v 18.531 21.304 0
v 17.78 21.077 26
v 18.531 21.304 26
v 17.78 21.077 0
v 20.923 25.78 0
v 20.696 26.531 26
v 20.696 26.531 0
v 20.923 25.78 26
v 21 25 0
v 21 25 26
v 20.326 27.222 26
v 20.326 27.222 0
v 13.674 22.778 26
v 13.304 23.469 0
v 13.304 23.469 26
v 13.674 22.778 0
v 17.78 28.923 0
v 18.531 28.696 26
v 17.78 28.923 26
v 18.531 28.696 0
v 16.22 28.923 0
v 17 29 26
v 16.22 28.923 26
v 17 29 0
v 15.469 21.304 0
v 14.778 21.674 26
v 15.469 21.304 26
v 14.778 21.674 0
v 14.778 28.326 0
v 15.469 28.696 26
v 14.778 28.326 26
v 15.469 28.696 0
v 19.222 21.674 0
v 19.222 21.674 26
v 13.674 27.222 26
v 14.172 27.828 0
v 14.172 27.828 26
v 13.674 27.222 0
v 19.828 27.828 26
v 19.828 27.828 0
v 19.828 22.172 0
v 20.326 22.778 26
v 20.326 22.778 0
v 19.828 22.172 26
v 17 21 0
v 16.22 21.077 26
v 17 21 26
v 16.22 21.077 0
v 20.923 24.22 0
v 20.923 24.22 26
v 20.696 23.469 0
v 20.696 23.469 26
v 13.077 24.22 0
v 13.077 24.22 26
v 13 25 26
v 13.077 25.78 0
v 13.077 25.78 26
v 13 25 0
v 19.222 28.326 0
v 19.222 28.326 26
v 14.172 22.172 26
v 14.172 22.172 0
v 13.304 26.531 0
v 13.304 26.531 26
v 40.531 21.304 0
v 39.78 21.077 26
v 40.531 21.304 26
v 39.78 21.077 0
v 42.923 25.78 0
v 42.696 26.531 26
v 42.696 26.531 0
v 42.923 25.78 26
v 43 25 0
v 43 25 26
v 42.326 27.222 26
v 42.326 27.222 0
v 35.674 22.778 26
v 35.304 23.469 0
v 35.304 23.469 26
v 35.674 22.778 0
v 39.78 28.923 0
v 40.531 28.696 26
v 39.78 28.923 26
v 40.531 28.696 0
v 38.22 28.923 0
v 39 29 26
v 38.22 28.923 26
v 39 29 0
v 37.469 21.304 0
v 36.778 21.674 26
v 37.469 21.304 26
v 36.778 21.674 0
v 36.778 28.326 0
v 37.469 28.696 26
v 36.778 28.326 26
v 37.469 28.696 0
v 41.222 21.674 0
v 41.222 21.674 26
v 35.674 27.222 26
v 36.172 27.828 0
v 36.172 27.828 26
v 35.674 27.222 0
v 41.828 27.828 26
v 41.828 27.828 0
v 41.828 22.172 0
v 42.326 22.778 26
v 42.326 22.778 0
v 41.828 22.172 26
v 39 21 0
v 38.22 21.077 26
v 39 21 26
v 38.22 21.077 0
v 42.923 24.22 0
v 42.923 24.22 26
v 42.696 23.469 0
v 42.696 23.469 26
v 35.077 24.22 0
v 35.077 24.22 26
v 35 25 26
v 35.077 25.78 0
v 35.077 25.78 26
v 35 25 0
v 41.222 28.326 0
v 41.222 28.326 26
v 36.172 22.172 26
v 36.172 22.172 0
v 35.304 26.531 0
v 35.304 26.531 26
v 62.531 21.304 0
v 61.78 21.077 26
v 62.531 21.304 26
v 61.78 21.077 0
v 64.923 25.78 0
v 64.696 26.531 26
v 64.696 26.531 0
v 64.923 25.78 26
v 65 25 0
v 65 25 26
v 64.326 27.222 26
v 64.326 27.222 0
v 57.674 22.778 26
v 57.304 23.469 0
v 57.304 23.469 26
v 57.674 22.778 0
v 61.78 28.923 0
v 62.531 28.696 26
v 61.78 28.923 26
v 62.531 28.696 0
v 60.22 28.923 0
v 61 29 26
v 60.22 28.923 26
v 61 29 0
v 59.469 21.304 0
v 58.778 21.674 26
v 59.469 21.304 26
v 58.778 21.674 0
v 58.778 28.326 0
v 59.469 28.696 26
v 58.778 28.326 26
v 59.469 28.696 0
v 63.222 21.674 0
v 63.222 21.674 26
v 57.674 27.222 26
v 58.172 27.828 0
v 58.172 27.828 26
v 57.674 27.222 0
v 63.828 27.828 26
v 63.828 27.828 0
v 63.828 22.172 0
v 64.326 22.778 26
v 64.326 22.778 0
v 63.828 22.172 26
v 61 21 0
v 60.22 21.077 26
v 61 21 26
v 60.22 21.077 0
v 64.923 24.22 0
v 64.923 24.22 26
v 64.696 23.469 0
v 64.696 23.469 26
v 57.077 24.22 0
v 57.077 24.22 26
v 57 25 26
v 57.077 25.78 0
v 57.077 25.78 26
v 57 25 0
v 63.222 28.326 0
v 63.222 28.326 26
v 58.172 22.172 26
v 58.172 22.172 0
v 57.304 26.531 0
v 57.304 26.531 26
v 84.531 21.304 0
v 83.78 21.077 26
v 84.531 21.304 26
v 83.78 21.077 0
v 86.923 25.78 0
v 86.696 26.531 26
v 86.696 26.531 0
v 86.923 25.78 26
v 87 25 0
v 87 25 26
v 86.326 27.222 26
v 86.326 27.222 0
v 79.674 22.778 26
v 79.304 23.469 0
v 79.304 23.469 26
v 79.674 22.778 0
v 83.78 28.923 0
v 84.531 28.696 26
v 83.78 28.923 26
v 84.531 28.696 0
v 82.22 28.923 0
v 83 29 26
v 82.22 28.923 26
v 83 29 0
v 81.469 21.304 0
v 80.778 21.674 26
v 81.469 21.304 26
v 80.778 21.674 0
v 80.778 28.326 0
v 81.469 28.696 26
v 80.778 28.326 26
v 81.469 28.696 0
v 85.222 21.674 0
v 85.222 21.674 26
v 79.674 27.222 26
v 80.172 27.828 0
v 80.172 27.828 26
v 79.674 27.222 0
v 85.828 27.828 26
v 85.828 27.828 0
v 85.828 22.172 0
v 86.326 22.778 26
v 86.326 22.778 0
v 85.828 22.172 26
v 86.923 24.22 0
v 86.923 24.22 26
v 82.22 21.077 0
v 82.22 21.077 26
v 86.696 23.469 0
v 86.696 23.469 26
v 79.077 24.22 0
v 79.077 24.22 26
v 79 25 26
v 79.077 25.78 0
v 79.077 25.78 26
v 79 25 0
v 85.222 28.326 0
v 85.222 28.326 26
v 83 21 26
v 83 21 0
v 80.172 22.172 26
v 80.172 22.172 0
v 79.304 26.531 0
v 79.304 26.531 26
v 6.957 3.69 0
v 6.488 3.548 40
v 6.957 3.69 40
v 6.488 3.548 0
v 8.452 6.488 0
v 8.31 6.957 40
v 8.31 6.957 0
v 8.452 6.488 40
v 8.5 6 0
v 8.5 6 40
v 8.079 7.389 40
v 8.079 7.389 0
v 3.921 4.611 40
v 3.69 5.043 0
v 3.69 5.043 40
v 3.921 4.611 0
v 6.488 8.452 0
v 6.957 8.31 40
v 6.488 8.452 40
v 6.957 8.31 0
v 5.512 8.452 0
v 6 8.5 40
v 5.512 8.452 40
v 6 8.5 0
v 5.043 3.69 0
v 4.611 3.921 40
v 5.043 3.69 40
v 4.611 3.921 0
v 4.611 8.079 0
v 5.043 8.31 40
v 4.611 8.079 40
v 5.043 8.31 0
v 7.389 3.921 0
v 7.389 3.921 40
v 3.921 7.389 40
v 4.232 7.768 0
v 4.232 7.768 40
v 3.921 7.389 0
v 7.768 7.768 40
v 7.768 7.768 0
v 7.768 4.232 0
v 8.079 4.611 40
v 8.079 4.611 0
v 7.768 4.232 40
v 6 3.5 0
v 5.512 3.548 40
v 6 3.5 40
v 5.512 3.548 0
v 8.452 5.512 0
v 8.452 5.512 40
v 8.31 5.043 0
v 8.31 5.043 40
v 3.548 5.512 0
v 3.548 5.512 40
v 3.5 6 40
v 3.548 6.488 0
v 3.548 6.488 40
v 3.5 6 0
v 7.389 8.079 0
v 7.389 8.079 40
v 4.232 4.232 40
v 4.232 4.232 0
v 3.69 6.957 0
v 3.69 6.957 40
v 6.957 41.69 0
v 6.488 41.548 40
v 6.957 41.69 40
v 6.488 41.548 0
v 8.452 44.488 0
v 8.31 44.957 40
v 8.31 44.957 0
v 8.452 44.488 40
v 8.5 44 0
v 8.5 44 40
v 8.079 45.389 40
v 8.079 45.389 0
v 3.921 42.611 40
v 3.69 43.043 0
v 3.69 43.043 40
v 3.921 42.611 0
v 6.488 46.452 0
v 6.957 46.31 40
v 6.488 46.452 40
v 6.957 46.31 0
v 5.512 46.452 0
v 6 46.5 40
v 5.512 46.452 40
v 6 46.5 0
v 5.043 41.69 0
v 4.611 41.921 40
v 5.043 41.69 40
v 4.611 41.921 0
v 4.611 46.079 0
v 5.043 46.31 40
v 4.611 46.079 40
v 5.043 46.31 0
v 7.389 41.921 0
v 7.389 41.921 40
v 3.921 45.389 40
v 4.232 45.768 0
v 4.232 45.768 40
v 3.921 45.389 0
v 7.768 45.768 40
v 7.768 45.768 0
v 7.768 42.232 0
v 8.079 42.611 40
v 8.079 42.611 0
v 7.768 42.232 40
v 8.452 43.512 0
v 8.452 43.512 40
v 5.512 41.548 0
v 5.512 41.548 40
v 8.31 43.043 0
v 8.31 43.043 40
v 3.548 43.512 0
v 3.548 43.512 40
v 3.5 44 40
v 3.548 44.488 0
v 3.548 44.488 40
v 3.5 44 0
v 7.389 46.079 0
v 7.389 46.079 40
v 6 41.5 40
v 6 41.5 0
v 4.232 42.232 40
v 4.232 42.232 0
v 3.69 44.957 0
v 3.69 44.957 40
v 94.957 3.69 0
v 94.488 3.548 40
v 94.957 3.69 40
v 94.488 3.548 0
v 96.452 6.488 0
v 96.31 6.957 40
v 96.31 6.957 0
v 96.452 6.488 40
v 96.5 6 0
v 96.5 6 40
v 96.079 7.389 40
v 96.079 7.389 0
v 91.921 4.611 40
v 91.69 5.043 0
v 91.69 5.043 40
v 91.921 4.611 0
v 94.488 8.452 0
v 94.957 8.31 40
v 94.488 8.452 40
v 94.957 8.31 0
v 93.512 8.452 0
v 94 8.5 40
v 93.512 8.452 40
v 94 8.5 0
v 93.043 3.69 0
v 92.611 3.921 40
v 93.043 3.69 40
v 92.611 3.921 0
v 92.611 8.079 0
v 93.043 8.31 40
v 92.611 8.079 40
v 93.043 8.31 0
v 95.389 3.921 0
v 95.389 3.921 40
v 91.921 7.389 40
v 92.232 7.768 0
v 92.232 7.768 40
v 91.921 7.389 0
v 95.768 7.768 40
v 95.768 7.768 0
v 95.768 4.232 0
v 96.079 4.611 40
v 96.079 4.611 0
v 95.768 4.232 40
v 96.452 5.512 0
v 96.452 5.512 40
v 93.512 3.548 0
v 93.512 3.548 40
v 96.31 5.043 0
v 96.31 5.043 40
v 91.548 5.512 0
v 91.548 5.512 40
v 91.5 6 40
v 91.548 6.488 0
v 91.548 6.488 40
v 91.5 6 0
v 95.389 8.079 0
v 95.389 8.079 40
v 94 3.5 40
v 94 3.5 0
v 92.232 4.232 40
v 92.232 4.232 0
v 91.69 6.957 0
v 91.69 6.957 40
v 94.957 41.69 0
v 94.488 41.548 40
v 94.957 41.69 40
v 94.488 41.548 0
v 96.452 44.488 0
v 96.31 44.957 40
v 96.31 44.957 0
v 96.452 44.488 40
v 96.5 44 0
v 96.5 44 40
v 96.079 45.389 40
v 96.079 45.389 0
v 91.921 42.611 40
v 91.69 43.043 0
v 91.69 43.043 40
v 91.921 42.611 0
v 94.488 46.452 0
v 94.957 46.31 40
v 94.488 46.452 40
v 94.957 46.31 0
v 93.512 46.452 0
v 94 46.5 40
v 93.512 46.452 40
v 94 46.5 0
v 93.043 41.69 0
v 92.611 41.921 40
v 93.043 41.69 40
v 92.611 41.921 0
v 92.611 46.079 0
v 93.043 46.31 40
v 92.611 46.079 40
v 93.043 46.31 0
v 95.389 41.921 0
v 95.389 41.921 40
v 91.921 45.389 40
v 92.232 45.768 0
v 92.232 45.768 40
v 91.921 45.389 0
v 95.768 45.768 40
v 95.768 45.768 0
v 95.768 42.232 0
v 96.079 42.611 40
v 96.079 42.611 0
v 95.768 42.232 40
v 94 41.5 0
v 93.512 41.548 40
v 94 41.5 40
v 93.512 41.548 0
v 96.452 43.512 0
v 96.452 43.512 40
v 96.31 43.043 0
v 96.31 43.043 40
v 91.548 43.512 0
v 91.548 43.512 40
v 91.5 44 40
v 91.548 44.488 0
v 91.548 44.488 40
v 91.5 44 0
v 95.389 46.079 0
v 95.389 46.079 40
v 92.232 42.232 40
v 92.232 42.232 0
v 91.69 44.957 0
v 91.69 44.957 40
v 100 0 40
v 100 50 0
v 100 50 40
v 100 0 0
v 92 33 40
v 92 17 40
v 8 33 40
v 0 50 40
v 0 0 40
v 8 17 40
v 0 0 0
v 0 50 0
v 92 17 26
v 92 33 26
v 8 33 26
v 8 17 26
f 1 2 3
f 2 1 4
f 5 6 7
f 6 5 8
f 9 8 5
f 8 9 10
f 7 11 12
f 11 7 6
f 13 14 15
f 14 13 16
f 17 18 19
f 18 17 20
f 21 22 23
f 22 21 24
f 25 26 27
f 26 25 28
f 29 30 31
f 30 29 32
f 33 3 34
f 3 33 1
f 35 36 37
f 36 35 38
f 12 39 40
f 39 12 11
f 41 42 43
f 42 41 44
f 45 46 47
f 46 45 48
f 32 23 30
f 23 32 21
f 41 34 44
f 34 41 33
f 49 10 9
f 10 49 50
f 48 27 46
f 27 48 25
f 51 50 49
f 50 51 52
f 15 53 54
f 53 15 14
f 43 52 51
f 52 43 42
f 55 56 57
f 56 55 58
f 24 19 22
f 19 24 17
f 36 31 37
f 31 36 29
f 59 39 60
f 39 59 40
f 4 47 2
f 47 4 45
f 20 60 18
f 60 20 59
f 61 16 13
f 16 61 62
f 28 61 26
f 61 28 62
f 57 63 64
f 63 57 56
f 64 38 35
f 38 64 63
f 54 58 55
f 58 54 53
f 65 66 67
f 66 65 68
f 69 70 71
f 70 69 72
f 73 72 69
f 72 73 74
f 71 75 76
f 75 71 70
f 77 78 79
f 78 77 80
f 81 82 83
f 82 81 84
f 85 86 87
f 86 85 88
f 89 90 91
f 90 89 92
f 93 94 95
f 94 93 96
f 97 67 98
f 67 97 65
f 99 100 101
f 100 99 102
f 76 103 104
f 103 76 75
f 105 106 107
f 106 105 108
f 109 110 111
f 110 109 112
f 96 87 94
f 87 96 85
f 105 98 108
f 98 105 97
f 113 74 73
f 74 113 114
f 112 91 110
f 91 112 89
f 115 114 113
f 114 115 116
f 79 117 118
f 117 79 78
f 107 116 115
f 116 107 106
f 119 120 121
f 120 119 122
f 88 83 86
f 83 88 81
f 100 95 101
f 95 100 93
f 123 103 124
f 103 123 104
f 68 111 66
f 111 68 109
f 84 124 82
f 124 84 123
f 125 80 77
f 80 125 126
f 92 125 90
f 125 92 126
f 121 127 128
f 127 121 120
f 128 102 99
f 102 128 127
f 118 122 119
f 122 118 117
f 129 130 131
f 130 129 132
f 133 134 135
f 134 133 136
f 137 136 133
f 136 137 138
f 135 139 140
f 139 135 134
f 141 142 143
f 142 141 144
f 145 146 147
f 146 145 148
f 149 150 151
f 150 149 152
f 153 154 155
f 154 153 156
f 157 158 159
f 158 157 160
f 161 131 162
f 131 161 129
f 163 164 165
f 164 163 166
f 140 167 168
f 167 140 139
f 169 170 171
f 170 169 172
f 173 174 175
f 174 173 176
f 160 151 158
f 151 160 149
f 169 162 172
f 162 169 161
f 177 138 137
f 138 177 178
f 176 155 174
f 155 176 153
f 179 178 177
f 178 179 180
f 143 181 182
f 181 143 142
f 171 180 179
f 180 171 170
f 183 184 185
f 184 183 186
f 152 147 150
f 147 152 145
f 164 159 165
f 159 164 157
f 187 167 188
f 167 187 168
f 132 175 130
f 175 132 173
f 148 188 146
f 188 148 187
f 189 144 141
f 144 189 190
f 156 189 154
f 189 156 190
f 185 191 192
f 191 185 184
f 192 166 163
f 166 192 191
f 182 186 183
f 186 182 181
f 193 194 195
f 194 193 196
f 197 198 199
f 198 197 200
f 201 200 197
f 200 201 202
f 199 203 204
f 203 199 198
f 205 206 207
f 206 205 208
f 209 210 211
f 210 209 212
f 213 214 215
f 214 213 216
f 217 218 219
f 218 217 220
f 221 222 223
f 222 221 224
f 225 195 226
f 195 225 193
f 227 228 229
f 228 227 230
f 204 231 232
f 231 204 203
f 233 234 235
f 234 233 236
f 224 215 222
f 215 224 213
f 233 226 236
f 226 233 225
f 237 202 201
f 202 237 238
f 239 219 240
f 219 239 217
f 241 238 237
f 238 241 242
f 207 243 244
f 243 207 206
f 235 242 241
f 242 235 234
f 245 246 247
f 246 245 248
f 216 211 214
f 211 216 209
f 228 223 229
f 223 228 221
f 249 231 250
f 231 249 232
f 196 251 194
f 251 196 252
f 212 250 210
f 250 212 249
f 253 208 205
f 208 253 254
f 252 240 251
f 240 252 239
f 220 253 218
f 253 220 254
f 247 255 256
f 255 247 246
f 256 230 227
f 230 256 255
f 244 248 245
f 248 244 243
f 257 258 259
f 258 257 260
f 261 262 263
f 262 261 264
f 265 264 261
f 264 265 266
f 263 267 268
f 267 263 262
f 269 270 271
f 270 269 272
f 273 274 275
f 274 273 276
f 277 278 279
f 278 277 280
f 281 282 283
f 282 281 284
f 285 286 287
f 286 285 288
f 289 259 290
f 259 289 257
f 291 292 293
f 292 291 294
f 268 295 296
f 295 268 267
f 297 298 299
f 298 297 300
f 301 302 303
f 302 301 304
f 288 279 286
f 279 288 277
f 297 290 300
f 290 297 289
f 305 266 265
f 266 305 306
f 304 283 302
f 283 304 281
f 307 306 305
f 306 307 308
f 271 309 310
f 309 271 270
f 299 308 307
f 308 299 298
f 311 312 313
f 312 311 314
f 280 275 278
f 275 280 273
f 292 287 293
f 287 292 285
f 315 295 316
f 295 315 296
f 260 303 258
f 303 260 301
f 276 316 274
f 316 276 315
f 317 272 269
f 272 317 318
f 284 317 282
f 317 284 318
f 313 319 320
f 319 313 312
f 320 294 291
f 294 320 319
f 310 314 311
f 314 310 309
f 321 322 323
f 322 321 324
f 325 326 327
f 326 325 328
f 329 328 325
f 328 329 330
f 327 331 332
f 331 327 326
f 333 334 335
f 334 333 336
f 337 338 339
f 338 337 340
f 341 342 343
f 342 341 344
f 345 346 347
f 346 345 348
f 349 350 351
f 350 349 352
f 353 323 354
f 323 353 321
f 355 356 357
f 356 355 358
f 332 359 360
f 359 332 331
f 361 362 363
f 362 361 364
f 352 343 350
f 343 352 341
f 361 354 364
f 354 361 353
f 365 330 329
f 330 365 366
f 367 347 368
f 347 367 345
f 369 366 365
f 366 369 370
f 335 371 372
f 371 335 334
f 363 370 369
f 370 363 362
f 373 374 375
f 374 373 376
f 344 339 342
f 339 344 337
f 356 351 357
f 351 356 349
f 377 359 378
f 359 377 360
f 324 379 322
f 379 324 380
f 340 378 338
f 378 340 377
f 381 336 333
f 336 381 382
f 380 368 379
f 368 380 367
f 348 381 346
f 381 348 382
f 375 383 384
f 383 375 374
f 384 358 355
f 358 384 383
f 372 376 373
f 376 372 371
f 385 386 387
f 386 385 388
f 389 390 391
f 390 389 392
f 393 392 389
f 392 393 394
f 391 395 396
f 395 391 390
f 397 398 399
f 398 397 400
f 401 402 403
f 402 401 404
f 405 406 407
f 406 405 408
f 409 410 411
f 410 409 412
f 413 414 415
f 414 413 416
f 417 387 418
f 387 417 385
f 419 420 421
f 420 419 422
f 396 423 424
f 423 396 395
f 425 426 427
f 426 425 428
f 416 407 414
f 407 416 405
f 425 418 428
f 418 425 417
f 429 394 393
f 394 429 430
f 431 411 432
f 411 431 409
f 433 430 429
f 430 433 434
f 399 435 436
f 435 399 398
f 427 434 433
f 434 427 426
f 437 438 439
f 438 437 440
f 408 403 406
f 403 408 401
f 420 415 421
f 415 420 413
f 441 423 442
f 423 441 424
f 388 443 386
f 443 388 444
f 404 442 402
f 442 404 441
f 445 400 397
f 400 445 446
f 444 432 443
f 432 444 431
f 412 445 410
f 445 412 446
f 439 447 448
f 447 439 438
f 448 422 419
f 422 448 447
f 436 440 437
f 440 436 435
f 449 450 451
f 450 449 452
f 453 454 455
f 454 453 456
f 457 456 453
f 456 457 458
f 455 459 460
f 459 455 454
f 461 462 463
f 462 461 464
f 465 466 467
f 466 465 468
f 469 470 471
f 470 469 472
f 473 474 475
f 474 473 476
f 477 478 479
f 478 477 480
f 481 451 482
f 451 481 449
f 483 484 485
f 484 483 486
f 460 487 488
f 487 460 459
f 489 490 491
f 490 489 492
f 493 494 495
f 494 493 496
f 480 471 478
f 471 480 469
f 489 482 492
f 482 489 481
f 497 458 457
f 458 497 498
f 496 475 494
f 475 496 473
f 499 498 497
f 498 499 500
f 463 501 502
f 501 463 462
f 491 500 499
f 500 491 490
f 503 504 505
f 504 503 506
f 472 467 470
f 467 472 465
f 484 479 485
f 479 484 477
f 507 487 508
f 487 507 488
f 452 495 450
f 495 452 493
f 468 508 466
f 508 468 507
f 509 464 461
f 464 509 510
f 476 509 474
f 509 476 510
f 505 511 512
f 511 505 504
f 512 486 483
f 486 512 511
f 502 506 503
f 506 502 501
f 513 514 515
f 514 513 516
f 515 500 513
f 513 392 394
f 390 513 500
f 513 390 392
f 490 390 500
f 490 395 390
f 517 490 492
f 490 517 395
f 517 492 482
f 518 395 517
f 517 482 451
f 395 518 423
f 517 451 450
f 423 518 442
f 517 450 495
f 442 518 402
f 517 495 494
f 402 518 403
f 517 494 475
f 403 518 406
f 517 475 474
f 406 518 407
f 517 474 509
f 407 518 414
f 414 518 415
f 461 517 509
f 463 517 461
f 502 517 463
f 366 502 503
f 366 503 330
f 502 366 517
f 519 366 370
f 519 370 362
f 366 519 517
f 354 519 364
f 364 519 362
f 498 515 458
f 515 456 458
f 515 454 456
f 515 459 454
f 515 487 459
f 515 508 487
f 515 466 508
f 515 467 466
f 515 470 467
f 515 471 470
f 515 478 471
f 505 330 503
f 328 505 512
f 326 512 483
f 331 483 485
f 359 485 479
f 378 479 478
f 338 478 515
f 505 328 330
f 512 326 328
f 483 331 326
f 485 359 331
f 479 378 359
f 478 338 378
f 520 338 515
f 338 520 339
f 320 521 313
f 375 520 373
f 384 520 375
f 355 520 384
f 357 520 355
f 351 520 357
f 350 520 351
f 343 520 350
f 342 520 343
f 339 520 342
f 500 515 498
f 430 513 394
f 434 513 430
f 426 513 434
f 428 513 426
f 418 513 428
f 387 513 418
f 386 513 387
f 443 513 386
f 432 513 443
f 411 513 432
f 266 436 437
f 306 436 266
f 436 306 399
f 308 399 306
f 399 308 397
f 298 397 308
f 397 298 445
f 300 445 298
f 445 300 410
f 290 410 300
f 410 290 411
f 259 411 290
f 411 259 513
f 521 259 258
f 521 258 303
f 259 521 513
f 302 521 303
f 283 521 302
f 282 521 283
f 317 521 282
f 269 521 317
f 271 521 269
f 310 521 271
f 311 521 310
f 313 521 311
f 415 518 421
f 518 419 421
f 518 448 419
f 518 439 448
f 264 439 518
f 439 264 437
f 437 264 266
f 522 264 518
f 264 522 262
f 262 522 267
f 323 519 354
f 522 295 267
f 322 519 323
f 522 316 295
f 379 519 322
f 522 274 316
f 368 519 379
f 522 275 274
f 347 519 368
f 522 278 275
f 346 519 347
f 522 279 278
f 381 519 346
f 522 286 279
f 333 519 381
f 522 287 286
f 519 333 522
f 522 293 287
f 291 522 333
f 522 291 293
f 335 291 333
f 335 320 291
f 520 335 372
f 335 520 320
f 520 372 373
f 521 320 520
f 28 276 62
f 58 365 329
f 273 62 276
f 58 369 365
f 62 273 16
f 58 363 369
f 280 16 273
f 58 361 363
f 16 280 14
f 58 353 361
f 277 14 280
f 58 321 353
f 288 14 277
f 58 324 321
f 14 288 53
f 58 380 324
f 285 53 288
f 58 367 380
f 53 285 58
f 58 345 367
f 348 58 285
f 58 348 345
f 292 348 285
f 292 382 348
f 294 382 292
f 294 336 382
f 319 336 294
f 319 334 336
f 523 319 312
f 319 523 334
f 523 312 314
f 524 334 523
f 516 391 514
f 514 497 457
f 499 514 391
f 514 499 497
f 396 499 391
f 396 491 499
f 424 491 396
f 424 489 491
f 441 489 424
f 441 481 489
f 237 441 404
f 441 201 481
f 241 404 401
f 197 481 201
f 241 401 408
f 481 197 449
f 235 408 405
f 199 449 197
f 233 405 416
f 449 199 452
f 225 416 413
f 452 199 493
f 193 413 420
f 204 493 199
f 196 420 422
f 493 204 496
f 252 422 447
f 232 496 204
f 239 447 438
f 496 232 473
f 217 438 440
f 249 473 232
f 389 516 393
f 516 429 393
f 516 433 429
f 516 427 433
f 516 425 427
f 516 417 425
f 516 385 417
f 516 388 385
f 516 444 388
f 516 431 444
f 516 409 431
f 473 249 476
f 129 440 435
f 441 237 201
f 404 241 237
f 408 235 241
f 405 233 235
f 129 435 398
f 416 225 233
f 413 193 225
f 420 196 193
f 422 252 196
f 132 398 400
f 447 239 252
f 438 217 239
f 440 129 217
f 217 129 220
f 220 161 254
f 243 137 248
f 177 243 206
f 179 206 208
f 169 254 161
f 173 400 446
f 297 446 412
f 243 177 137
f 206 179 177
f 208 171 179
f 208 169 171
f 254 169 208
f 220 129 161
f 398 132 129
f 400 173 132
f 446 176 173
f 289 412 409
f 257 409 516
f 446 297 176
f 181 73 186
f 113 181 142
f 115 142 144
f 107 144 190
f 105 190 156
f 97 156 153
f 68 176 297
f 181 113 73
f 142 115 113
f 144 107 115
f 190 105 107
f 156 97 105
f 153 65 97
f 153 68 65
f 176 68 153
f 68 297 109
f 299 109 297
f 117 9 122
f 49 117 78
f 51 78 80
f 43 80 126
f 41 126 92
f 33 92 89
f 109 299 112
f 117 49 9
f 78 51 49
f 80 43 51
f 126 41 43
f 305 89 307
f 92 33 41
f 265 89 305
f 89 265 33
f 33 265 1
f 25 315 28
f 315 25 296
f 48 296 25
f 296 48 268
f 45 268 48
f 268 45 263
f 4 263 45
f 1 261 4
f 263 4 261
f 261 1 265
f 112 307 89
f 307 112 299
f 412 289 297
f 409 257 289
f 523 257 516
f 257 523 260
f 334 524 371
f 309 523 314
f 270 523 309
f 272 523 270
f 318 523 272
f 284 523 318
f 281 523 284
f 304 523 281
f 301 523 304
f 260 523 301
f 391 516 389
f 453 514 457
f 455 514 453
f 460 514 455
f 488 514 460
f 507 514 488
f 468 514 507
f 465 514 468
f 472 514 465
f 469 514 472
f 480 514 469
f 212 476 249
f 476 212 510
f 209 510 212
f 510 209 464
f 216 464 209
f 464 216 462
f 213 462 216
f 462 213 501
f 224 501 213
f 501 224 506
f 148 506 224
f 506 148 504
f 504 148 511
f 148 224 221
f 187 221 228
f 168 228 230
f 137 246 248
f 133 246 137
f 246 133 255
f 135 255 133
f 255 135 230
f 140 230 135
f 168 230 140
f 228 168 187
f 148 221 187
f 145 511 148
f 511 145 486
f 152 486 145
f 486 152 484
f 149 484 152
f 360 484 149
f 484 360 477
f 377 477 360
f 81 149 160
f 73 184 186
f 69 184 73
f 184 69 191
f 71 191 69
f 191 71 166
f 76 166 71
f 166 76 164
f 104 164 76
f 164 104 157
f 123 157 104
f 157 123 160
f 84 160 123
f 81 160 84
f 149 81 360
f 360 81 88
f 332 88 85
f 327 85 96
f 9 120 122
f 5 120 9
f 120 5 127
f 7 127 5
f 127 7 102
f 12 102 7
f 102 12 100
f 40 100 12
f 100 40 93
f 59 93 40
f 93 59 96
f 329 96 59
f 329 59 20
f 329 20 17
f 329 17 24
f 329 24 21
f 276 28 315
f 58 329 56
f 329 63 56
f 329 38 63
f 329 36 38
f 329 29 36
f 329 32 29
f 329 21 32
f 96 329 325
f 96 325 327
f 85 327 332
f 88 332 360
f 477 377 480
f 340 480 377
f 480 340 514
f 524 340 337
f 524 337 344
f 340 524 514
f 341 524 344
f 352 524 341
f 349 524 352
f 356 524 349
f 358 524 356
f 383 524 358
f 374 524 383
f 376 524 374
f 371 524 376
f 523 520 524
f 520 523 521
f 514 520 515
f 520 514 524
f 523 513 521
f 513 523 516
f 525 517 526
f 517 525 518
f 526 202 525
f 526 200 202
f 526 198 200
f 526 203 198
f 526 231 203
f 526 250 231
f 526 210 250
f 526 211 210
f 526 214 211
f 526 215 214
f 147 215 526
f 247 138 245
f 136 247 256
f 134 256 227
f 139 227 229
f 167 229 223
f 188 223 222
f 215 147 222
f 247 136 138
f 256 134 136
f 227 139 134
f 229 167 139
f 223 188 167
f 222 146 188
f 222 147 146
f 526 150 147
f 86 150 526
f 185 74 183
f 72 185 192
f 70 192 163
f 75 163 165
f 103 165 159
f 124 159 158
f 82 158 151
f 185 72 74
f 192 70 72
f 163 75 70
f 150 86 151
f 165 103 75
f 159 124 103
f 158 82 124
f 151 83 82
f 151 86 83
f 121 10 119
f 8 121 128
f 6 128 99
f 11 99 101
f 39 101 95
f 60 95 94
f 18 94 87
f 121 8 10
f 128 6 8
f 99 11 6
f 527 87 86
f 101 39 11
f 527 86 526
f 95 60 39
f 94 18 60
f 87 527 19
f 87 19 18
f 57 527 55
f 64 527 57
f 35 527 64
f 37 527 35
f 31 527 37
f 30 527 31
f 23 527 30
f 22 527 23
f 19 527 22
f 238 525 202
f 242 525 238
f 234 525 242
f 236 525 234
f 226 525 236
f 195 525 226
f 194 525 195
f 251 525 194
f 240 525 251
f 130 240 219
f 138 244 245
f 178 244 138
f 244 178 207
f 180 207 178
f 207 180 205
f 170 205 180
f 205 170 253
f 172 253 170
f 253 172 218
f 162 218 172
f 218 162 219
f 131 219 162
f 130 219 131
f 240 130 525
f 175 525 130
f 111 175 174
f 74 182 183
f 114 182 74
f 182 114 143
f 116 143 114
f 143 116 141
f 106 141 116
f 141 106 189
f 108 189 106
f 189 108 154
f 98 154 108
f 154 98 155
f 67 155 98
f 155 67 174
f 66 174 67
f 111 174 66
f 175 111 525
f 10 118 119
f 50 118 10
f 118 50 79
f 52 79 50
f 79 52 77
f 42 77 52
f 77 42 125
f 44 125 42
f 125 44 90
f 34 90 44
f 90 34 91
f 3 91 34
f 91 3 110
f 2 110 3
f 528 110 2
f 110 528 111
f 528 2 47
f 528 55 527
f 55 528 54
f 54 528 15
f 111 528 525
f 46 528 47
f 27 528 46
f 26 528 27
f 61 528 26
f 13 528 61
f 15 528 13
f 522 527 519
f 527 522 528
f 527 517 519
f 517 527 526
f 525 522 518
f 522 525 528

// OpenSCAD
$fn = 32;

// ----------------------------------------------------------------------
// Manifold block: gallery_top manifold
// ----------------------------------------------------------------------

// --- parameters (mm) ---
block_l = 100;            // block length, X
block_w = 50;             // block width, Y
block_h = 40;             // block height, Z
port_d = 8;               // port bore diameter
port_pitch = 22;          // port pitch along X
gallery_d = 16;           // top gallery width, Y
gallery_depth = 14;       // gallery pocket depth
wall_p = 8;               // gallery end wall thickness, X
mnt_d = 5;                // mounting hole diameter
mnt_in = 6;               // mounting hole inset from the edges
fit_tol = 0.02;           // tolerance for press fits, mm
free_tol = 0.2;           // tolerance for clearance fits, mm

n_ports = 4;  // ports in the row
port_x0 = (block_l - (n_ports - 1) * port_pitch) / 2;  // first port X

difference() {
  cube([block_l, block_w, block_h]);
  for (i = [0 : n_ports - 1])
    translate([port_x0 + i * port_pitch, block_w / 2, -1])
      cylinder(h = block_h + 2, d = port_d);
  translate([wall_p, block_w / 2 - gallery_d / 2, block_h - gallery_depth])
    cube([block_l - 2 * wall_p, gallery_d, gallery_depth + 1]);
  for (cx = [mnt_in, block_l - mnt_in])
    for (cy = [mnt_in, block_w - mnt_in])
      translate([cx, cy, -1]) cylinder(h = block_h + 2, d = mnt_d);
}
